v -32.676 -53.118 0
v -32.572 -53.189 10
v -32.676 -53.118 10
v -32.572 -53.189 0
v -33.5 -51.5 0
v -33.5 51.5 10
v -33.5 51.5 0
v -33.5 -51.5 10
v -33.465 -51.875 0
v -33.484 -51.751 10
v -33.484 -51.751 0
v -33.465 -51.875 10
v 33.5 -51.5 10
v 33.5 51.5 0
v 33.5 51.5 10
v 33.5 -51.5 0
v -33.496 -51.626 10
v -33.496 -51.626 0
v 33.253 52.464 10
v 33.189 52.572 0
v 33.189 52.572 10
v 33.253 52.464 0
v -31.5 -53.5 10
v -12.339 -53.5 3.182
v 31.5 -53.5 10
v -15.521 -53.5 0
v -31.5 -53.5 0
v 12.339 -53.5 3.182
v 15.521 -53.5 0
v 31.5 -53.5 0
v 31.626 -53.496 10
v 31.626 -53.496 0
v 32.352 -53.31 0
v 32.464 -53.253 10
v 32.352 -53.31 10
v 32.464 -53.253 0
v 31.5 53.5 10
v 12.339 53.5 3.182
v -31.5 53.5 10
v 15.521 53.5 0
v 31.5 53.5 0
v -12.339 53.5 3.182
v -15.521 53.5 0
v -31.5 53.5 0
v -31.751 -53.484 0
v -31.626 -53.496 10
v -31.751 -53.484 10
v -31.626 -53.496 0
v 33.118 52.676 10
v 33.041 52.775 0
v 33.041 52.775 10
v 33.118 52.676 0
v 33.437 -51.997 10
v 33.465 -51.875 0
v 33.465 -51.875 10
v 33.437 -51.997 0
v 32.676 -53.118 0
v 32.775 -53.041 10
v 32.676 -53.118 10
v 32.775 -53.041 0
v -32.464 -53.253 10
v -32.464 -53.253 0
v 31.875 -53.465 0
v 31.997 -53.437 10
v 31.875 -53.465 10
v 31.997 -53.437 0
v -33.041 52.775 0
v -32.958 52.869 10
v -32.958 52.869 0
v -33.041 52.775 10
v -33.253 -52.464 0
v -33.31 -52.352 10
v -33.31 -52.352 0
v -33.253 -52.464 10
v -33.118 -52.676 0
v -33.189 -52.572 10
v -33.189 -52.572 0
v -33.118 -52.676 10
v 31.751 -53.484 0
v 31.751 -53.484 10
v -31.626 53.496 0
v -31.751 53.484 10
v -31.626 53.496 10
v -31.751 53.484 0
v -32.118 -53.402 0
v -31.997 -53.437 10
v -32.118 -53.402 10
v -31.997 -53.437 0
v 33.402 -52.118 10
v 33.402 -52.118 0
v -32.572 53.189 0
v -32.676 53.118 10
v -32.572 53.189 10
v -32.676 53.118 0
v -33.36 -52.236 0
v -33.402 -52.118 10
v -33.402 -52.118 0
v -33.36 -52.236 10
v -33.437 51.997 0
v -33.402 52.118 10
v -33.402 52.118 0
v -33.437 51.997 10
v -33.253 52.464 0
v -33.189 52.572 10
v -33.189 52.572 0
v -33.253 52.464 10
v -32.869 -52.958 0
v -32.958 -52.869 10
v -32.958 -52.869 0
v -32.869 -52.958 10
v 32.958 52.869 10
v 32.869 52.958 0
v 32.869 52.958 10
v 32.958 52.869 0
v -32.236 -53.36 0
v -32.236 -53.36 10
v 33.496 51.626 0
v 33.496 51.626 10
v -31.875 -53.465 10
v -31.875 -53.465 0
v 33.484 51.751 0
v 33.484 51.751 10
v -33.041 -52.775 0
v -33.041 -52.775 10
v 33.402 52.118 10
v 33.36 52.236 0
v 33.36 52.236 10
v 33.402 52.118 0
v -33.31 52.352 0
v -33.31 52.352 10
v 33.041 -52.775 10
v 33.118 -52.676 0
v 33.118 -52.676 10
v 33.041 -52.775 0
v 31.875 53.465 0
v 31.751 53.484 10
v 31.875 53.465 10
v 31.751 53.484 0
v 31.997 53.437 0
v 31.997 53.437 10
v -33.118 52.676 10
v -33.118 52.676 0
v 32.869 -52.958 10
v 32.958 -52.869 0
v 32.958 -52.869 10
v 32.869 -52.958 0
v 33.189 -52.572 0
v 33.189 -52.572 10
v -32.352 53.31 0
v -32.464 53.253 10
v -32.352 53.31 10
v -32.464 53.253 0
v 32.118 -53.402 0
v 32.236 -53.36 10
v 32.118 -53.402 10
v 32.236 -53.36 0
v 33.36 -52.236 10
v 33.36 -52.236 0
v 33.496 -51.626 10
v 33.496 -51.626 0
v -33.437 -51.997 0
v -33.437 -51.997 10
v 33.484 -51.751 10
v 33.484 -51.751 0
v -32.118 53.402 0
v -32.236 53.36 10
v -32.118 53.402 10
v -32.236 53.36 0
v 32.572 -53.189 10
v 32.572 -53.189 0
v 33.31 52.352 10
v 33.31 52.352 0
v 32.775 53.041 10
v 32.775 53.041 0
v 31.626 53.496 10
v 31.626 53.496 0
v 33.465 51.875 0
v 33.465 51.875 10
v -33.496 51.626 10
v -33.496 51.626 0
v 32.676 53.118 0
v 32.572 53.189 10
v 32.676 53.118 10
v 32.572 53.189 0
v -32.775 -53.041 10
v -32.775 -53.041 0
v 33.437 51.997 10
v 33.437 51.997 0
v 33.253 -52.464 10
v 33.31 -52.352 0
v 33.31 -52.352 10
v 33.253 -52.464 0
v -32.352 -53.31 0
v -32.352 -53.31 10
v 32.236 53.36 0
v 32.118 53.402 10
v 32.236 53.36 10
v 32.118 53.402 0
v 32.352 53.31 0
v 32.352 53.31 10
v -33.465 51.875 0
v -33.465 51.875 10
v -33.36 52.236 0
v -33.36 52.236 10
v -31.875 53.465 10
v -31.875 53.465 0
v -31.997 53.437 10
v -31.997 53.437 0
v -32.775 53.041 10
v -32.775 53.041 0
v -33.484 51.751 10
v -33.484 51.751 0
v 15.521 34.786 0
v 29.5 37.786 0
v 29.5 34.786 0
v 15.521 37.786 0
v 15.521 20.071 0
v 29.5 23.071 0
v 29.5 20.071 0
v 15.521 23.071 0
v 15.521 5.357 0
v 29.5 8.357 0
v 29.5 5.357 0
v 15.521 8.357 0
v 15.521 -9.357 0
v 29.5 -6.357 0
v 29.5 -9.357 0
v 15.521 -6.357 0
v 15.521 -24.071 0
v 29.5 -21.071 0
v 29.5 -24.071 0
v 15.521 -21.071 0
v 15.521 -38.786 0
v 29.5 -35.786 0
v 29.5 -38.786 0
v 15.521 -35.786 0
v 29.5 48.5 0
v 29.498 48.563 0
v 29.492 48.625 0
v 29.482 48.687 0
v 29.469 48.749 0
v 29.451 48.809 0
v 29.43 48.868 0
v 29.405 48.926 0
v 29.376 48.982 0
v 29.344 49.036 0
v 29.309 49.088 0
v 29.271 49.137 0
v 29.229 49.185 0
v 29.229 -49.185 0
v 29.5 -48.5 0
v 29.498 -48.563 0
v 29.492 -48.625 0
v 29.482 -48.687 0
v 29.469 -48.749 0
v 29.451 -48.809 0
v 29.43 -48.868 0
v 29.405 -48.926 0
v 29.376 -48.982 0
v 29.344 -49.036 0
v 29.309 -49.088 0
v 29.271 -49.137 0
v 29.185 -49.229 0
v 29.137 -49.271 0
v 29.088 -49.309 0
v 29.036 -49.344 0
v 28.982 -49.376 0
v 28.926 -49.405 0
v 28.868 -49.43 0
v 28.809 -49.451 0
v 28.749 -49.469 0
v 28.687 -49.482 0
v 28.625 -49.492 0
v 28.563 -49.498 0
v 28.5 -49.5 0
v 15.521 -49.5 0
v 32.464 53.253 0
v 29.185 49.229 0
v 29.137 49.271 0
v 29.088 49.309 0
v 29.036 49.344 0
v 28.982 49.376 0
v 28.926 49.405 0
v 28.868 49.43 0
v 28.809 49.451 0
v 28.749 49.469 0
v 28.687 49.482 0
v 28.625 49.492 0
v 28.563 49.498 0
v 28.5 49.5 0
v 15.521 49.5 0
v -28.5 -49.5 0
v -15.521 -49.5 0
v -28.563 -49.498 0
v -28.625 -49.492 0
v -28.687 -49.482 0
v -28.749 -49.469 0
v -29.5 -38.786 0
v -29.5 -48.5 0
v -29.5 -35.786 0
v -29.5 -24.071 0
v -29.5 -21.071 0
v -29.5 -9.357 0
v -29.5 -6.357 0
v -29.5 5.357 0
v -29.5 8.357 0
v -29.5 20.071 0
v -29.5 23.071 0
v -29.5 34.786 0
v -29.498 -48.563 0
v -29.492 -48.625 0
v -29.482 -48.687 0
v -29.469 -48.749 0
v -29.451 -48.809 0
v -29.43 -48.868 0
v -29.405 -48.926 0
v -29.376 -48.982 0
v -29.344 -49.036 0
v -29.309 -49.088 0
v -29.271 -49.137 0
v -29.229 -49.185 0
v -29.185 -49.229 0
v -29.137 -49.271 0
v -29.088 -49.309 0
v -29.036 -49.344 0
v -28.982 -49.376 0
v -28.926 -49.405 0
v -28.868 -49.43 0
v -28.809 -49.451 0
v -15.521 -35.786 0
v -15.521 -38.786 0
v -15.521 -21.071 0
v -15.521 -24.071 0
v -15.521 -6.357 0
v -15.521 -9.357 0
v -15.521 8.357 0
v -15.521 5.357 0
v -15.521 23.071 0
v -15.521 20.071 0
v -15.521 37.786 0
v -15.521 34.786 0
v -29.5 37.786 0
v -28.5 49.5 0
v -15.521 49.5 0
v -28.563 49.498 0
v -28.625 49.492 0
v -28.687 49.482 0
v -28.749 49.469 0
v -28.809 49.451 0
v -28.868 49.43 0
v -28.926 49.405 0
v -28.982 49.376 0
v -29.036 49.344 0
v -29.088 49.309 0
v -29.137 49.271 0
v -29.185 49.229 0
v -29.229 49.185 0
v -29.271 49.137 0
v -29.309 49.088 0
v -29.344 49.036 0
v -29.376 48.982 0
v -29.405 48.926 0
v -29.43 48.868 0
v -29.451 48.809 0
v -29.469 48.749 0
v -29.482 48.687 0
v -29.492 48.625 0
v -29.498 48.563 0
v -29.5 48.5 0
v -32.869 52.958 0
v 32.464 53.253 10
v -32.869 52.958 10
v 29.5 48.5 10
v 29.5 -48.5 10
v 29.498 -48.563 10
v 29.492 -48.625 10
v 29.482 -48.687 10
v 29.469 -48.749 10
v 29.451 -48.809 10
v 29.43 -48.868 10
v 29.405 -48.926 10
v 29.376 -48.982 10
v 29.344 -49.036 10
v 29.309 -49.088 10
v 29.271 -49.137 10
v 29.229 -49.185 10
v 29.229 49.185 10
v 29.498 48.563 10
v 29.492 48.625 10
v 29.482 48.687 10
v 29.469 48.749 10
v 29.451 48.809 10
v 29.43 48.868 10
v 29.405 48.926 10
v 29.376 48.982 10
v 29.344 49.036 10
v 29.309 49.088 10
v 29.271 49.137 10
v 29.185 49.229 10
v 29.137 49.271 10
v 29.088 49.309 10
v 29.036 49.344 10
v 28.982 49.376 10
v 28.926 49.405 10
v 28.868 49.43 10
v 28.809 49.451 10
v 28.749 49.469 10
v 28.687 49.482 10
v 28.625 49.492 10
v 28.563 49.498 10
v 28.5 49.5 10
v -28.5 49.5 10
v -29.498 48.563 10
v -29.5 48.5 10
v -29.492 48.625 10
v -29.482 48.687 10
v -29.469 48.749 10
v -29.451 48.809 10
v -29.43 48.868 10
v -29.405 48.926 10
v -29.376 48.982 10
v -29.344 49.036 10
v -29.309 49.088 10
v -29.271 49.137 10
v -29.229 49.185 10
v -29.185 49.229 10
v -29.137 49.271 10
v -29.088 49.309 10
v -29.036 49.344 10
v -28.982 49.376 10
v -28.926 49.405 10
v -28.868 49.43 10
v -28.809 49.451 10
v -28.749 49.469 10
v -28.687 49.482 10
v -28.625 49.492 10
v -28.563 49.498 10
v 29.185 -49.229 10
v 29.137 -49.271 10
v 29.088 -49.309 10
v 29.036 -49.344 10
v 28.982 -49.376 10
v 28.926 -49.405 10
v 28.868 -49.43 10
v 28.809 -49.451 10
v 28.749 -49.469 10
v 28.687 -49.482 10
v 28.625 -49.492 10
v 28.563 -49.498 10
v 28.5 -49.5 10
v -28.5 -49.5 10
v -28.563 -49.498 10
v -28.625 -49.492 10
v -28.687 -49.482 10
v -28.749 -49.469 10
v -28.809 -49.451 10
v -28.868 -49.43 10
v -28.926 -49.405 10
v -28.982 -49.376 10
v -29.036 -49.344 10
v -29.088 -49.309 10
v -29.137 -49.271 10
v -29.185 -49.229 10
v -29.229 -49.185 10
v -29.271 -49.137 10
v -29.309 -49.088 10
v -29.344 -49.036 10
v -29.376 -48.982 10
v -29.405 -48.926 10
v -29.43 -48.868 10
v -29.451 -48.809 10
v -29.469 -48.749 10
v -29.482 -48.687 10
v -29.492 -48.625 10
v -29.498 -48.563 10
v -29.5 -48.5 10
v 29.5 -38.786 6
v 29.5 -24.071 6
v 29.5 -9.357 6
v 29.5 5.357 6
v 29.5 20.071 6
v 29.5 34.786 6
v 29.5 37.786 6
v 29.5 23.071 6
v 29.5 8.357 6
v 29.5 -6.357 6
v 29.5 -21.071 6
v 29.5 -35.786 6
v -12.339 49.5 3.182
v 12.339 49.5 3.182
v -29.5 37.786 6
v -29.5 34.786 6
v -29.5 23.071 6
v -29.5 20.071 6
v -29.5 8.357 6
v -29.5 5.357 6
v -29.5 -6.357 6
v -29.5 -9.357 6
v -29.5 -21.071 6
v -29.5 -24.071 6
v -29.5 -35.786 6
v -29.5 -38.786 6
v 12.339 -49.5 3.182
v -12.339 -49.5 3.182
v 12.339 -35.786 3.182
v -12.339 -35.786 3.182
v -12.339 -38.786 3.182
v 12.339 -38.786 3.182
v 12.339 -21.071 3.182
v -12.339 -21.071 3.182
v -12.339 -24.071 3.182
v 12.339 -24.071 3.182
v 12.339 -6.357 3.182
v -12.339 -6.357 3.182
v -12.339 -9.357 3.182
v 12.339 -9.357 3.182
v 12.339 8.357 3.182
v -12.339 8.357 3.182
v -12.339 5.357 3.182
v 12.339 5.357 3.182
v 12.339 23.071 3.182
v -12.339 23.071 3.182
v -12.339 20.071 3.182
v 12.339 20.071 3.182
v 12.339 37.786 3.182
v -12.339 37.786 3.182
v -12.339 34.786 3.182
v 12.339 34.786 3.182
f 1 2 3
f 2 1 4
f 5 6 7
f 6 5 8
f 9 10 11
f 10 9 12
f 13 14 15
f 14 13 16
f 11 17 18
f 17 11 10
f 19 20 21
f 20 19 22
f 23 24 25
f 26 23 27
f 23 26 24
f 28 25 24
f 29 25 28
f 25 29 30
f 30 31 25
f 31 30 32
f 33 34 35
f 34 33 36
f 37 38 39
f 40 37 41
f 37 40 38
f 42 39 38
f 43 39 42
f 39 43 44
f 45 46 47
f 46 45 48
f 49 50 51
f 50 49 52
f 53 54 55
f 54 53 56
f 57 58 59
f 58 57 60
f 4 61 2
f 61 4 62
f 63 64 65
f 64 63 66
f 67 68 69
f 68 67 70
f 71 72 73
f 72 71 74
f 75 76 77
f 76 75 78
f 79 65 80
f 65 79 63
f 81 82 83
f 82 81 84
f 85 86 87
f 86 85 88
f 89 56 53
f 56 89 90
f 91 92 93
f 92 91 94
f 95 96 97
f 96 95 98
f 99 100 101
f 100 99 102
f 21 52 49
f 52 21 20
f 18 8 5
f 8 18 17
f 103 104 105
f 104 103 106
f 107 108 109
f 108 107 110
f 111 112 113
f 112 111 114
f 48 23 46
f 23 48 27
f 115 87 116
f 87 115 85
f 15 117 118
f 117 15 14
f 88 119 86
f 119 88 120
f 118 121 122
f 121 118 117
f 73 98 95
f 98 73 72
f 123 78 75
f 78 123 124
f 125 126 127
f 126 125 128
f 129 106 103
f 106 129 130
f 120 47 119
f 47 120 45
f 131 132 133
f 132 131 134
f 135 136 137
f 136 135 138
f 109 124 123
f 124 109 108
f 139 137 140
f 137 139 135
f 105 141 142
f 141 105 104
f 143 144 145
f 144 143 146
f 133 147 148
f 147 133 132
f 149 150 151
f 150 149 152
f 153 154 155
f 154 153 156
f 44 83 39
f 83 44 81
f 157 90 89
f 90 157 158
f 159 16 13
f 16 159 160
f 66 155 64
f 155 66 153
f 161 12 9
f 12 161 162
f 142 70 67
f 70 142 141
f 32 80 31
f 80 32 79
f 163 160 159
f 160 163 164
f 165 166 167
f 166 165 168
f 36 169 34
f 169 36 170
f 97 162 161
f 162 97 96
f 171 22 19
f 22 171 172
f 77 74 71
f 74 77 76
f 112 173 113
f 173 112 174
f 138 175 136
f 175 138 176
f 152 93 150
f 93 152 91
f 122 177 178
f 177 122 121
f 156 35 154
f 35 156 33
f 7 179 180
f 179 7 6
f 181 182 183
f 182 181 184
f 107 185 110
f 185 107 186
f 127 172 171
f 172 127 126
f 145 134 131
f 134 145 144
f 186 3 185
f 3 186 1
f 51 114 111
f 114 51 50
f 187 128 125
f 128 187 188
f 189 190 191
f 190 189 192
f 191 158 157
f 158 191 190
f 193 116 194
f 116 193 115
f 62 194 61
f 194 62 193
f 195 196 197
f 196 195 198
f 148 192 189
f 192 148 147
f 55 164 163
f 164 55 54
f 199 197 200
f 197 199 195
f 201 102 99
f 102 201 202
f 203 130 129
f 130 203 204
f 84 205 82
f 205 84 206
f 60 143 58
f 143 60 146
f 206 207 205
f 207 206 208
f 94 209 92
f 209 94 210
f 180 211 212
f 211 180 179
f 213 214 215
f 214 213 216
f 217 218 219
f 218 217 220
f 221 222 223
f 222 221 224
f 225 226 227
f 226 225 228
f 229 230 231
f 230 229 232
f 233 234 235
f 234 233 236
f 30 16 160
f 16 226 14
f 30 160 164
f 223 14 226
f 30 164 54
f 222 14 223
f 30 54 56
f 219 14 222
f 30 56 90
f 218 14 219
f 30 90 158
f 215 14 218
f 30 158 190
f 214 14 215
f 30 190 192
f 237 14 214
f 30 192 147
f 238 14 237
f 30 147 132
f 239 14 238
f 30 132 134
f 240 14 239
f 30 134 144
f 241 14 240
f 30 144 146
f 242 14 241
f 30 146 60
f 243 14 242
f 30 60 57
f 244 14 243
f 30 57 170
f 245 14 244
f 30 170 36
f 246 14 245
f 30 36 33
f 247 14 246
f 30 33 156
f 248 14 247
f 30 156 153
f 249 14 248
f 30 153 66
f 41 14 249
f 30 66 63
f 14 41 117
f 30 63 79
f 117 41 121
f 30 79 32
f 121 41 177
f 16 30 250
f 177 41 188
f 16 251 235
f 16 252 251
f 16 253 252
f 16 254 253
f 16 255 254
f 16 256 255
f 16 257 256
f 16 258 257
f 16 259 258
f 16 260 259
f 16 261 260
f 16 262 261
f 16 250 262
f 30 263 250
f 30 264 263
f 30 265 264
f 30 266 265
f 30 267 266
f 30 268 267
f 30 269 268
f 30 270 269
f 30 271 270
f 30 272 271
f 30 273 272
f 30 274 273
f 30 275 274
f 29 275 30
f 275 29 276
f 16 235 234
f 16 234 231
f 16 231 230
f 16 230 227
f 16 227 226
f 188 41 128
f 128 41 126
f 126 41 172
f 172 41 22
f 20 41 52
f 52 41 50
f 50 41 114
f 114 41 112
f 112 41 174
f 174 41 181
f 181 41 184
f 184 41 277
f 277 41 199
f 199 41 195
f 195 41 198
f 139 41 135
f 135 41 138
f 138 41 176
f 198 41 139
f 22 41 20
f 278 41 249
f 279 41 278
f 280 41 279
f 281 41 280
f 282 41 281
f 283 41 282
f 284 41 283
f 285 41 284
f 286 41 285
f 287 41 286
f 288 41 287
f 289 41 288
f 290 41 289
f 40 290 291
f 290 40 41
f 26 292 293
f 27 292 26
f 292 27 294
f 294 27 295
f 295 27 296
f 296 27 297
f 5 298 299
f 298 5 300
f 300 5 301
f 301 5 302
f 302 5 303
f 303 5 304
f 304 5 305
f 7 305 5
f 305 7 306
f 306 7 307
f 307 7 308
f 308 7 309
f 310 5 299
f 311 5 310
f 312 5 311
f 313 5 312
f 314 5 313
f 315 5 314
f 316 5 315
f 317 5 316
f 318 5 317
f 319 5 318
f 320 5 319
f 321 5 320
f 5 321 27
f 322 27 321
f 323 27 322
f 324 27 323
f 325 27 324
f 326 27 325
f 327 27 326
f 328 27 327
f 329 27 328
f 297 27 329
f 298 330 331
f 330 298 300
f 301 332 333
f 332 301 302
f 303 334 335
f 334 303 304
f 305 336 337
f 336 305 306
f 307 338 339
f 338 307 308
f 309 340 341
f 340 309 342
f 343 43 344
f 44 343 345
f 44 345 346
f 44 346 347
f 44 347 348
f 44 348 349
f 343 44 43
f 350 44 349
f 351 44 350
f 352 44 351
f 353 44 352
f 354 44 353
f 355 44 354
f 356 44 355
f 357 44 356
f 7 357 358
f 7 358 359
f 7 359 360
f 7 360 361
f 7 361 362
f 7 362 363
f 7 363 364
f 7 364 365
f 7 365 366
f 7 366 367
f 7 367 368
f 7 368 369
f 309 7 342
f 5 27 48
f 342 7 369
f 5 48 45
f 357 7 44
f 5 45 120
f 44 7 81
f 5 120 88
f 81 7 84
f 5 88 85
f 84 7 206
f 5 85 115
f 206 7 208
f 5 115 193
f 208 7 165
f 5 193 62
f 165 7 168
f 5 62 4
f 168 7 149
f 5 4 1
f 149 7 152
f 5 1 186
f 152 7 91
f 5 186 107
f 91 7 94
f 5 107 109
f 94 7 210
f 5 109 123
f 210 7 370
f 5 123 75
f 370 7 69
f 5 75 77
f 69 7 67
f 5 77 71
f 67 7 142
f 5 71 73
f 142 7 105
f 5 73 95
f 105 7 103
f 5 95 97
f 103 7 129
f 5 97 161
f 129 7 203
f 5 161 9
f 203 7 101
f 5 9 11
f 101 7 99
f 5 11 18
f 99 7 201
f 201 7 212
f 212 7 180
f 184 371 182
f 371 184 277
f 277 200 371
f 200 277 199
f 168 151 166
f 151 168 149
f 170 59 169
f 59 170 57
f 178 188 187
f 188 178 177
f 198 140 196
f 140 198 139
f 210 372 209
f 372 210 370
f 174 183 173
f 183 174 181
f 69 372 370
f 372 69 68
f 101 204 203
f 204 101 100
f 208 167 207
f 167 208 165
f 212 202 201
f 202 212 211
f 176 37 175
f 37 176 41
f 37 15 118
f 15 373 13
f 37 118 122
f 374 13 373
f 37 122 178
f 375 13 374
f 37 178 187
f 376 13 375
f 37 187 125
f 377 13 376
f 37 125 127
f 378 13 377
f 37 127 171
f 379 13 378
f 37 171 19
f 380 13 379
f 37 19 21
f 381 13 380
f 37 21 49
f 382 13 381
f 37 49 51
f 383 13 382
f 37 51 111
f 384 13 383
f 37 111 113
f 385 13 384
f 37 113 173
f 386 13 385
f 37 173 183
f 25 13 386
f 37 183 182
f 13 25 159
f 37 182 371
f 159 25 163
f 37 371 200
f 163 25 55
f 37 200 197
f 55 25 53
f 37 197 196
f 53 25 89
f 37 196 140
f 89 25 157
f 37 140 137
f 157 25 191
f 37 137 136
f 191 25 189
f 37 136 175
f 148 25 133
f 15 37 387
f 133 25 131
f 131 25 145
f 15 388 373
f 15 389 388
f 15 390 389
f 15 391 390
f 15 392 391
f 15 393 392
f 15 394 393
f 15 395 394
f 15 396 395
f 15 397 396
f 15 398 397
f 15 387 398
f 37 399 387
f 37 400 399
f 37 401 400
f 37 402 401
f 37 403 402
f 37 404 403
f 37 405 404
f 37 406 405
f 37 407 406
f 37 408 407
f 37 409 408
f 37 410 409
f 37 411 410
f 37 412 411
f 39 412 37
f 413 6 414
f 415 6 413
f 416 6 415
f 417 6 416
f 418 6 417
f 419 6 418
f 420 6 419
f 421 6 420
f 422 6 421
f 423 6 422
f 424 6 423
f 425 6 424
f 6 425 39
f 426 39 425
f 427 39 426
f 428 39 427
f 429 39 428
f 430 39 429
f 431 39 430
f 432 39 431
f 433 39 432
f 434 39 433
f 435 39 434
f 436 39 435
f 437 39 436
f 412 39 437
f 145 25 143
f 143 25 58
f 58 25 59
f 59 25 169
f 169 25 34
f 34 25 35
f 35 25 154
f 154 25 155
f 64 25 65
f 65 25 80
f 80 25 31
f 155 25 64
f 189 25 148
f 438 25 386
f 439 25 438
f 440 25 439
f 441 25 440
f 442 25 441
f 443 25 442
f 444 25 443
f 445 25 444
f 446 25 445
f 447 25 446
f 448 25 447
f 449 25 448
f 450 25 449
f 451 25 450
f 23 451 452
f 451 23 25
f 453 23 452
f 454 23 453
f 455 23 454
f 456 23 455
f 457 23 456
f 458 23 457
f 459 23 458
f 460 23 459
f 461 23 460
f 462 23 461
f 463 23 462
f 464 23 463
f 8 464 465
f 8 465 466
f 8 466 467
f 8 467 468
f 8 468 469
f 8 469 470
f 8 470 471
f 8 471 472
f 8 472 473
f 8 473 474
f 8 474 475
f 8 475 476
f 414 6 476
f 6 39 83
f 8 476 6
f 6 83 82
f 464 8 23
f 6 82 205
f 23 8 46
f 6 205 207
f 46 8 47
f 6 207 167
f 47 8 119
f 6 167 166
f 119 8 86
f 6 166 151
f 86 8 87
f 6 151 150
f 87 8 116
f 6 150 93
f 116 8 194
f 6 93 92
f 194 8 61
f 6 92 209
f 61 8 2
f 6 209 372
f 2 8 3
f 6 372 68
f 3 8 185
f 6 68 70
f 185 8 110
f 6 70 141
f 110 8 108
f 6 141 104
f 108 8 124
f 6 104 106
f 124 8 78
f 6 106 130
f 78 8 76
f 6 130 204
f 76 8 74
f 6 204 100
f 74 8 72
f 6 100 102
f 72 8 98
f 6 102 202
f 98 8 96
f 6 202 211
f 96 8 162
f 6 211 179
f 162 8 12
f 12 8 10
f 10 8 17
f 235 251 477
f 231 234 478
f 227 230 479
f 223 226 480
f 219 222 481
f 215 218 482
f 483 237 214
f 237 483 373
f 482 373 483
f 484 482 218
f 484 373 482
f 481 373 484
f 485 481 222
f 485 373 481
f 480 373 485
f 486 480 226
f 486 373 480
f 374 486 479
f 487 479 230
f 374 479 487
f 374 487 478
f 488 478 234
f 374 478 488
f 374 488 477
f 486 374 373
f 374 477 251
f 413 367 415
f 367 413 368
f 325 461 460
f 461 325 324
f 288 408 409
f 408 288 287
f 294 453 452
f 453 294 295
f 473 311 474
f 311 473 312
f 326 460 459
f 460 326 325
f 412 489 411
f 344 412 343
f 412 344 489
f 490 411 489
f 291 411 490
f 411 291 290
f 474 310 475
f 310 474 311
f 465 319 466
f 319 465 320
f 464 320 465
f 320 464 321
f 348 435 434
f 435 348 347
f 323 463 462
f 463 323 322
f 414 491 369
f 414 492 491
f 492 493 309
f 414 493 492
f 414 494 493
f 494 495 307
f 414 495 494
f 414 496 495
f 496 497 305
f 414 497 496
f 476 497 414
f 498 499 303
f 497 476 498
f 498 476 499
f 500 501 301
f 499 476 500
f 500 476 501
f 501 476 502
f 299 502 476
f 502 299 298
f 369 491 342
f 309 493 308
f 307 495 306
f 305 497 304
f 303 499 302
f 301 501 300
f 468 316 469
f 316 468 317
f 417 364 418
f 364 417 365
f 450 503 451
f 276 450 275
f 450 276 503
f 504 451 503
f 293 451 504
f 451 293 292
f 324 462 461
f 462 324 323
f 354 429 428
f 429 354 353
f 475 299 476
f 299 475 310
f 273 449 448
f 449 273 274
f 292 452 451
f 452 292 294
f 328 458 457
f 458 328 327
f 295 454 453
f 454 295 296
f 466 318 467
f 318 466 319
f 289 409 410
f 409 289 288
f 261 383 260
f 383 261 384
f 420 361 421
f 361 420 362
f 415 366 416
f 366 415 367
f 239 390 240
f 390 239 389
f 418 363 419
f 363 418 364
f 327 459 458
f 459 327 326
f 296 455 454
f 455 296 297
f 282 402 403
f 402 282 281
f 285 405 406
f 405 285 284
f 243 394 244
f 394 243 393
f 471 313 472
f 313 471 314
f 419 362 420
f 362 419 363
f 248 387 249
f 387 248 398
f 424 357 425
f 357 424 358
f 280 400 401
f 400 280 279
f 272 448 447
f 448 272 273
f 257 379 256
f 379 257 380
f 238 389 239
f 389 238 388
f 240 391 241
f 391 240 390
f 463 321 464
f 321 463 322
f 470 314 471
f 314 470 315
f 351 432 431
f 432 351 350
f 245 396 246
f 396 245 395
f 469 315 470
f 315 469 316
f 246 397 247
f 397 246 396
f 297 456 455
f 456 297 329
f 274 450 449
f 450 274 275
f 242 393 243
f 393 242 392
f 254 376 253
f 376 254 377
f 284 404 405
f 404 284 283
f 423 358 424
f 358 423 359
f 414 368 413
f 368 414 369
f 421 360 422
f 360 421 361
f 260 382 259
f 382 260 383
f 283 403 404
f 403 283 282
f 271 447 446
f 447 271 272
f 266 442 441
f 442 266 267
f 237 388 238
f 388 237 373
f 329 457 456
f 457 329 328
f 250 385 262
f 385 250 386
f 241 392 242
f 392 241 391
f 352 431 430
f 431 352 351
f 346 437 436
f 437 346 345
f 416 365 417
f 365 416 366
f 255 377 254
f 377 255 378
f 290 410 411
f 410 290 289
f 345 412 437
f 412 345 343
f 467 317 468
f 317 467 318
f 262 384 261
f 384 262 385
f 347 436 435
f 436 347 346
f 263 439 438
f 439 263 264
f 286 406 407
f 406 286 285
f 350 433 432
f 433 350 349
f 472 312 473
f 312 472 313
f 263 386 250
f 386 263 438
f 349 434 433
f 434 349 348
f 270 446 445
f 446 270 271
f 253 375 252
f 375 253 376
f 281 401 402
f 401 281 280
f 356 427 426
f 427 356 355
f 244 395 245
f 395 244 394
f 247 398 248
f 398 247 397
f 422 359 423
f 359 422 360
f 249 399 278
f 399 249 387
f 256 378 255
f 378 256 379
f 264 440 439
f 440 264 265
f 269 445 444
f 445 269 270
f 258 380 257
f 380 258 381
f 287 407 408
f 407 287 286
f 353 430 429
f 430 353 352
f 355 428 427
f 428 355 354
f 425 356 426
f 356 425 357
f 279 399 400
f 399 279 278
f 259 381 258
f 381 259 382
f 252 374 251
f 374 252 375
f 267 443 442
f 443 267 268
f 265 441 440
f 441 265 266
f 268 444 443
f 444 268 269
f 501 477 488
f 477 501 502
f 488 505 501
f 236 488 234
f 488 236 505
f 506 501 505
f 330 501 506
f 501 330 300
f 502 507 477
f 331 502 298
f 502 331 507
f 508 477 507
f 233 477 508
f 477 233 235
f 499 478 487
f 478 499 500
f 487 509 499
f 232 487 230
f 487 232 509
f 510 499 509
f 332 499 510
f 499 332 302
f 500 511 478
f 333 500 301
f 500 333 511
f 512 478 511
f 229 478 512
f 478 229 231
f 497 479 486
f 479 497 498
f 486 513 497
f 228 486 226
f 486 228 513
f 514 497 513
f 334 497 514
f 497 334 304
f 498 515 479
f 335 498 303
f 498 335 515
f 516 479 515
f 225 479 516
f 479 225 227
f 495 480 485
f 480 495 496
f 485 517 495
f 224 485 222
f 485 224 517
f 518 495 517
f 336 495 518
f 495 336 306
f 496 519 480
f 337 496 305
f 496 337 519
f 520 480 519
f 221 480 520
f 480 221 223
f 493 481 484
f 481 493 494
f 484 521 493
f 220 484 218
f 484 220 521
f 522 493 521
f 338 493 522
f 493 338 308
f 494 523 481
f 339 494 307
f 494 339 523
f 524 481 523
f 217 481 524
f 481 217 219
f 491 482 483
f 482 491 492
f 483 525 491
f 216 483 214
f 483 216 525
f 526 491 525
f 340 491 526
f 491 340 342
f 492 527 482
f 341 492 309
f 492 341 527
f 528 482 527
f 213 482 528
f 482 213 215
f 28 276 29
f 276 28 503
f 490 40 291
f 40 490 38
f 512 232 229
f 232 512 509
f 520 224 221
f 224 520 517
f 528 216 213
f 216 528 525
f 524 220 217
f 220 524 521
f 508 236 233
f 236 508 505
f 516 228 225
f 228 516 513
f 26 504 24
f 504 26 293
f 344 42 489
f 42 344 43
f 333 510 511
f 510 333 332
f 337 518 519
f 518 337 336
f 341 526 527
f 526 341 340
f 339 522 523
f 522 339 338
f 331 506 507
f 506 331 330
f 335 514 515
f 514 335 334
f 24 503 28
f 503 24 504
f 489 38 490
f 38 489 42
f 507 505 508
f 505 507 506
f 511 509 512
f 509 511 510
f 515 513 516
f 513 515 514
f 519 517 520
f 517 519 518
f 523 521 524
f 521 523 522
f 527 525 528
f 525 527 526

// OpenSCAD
$fn=100;

sl=95;
sw=55;
t=4;

/*********/
l=sl+t*3;
w=sw+t*3; 
h=6;
div=6;
s=(l-t)/(div+1);

difference(){
    union(){
        difference(){
            translate([-w/2,-l/2,0])
            rcube(w,l,h+t,2);
            
            translate([-w/2+t,-l/2+t,-.1])
            rcube(w-t*2,l-t*2,h+t+1,1);
        }
          
        for(i=[-l/2+t/2+s:s:l/2-t*2]){
            translate([0,i,0])
            translate([-w/2,-t/2,0])
            cube([w,h/2,h]);
        }
    }
        
    hull(){
        translate([-w/5,0,0])
        rotate([0,45,0])
        cube([h/2,l*2,h],true);
        
        translate([w/5,0,0])
        rotate([0,-45,0])
        cube([h/2,l*2,h],true);
    }
}    

module rcube(length,width,height,radius=.5){    
    l=length-2*radius;
    w=width-2*radius;
    translate([radius,radius,0])
    hull(){
        cylinder(r=radius,h=height);    
        translate([0,w,0])
        cylinder(r=radius,h=height);    
        translate([l,0,0])
        cylinder(r=radius,h=height);    
        translate([l,w,0])
        cylinder(r=radius,h=height);    
    }
}
